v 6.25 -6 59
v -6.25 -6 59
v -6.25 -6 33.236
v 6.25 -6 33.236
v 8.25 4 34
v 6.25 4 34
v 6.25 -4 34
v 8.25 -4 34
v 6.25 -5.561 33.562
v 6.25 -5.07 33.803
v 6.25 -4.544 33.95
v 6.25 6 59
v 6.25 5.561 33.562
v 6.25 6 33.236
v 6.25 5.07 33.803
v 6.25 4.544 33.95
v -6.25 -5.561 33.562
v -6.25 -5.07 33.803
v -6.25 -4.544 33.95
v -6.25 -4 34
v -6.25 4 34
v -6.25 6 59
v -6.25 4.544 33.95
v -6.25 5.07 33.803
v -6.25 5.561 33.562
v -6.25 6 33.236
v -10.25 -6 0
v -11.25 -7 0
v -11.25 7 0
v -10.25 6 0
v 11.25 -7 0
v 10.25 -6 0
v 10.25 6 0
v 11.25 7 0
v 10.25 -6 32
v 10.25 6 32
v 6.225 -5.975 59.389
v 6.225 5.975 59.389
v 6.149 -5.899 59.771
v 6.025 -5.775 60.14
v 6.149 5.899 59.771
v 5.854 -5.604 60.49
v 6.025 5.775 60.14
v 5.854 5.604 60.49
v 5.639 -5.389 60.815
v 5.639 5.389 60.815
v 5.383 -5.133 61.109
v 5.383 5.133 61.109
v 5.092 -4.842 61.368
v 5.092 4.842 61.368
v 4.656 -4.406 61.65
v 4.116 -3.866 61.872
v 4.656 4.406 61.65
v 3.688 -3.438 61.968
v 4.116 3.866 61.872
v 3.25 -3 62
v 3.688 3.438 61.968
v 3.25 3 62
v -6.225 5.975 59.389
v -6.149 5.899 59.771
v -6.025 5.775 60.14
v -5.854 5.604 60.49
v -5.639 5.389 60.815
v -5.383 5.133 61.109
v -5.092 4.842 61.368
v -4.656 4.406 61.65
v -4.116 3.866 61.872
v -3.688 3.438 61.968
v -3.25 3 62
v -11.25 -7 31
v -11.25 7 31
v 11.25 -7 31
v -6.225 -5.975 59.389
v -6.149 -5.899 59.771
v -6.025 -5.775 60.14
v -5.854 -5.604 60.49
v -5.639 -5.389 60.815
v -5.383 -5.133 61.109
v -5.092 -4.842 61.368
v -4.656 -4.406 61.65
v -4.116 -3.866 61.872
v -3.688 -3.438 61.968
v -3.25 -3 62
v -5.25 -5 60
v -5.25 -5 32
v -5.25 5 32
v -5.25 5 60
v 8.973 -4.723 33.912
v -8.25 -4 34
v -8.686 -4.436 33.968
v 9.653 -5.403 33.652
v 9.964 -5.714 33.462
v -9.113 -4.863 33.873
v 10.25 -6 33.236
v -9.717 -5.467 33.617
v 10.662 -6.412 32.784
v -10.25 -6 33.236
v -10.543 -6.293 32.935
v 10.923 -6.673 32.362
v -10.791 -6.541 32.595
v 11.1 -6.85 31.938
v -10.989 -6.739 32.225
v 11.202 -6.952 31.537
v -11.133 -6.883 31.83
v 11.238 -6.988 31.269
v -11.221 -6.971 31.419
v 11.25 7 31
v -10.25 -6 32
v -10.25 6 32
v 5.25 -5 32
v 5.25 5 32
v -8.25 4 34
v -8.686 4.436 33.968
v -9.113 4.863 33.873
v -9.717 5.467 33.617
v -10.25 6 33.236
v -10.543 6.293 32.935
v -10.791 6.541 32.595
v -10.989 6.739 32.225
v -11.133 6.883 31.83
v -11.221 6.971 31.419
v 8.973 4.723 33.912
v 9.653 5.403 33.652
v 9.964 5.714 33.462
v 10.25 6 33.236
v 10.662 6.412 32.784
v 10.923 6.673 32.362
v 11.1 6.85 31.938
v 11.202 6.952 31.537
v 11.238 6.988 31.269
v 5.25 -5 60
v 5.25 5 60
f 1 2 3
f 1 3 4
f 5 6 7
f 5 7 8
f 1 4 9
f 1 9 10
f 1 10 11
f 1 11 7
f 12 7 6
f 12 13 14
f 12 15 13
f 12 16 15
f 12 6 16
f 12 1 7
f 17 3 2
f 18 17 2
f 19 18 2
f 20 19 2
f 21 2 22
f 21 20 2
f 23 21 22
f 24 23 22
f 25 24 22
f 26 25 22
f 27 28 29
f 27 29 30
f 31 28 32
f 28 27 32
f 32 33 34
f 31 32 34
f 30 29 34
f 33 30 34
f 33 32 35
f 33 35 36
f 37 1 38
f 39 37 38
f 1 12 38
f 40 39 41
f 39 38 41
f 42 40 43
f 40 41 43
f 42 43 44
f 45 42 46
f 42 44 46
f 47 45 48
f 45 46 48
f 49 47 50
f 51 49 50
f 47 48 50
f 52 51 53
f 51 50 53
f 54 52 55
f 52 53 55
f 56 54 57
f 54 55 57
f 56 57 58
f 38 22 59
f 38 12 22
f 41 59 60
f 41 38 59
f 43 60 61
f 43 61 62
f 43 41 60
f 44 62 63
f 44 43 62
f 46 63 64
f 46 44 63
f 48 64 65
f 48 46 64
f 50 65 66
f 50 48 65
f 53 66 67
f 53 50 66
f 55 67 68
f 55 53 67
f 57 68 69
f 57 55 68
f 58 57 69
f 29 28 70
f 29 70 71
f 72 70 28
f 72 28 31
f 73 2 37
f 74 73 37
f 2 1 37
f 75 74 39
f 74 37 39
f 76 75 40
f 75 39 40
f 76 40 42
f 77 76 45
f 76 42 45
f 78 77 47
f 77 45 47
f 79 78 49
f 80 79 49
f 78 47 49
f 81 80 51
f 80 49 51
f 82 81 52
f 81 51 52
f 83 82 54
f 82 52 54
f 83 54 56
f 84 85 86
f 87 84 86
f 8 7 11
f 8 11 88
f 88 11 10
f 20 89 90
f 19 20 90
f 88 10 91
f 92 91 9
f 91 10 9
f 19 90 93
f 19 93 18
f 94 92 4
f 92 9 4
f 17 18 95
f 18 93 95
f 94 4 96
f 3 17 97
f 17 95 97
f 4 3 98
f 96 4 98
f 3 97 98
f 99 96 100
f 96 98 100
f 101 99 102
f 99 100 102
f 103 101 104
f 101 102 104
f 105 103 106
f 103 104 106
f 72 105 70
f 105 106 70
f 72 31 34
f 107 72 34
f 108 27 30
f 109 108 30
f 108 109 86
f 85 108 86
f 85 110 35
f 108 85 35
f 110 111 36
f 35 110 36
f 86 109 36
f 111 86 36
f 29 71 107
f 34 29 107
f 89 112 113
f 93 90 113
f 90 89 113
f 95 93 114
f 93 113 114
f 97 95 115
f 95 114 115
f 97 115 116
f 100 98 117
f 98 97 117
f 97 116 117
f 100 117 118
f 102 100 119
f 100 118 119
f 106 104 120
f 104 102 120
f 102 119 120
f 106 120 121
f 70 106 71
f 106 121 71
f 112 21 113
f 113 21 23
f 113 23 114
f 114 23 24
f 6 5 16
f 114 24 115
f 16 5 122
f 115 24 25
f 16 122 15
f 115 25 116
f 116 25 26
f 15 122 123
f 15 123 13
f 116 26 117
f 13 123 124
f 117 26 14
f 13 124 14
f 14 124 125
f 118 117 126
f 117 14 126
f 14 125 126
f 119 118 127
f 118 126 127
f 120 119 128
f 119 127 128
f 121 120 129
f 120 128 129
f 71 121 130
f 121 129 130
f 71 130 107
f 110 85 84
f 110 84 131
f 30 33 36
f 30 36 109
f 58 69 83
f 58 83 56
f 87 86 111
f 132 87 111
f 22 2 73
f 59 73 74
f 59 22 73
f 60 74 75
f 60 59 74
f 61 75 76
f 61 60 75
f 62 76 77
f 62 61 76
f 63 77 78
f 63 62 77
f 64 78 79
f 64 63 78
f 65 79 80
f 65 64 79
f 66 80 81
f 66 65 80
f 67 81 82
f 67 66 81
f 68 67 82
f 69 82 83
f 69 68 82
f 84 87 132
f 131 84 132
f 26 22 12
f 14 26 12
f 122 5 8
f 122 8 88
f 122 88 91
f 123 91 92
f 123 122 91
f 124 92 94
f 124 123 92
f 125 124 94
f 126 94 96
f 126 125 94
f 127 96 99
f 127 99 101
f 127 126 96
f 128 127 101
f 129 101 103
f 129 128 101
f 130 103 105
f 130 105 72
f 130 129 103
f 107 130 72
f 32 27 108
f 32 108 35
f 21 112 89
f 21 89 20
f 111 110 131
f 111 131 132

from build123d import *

# Parameters (mm, degrees)
F0_W         = 12.5
F0_H         = 12
F0_W_2       = 10.5
F0_H_2       = 10
F1_DEPTH     = 62
F0_W_3       = 22.5
F0_H_3       = 14
F0_W_4       = 4
F2_DEPTH     = 34
F3_DEPTH     = 60
F4_DEPTH     = 32
F5_R         = 3
F6_T1_DEPTH  = 29
F6_T6_DEPTH  = 37.5
F6_T11_DEPTH = 37.5
F6_T16_DEPTH = 37.5
F6_T21_DEPTH = 37.5
F6_T26_DEPTH = 37.5
F6_T31_DEPTH = 37.5


# Not quite as in the source:
# - a fillet or chamfer that OpenCascade refuses, or shapes differently, is made with other operations: its cross-section is extruded or revolved along the edge and cut away or added


with BuildPart() as f1:
    # F0 (on Top) → F1 (new body)
    with BuildSketch(Plane.XY):
        Rectangle(F0_W, F0_H)
        Rectangle(F0_W_2, F0_H_2, mode=Mode.SUBTRACT)
        Rectangle(F0_W_2, F0_H_2)
    extrude(amount=F1_DEPTH)

    # F0 (on Top) → F2 (join)
    with BuildSketch(Plane.XY):
        Rectangle(F0_W_3, F0_H_3)
        Polygon((-10.25, -6), (-10.25, 6), (-6.25, 6), (6.25, 6), (10.25, 6), (10.25, -6), (6.25, -6), (-6.25, -6), align=None, mode=Mode.SUBTRACT)
        with Locations((-8.25, 0)):
            Rectangle(F0_W_4, F0_H)
        with Locations((8.25, 0)):
            Rectangle(F0_W_4, F0_H)
    extrude(amount=F2_DEPTH)

    # F0 (on Top) → F3 (cut)
    with BuildSketch(Plane.XY):
        Rectangle(F0_W_2, F0_H_2)
    extrude(amount=F3_DEPTH, mode=Mode.SUBTRACT)

    # F0 (on Top) → F4 (cut)
    with BuildSketch(Plane.XY):
        Rectangle(F0_W, F0_H)
        Rectangle(F0_W_2, F0_H_2, mode=Mode.SUBTRACT)
        with Locations((-8.25, 0)):
            Rectangle(F0_W_4, F0_H)
        with Locations((8.25, 0)):
            Rectangle(F0_W_4, F0_H)
    extrude(amount=F4_DEPTH, mode=Mode.SUBTRACT)

    # F5
    f5_edges = [f1.edges().sort_by_distance(p)[0] for p in [
        (0, 6, 62),
        (-6.25, 0, 62),
        (0, -6, 62),
        (6.25, 0, 62),
    ]]
    fillet(f5_edges, radius=F5_R)

    # F6: fillet of radius 3 on 4 edges, made by hand

    # F6_s2 → F6_t1 (cut)
    with BuildSketch(Plane.XZ.offset(-14.5)):
        with BuildLine():
            ThreePointArc((-8.25, 34), (-10.3713203436, 33.1213203436), (-11.25, 31))
            Line((-11.25, 31), (-11.25, 34))
            Line((-11.25, 34), (-8.25, 34))
        make_face()
        with BuildLine():
            ThreePointArc((8.25, 34), (10.3713203436, 33.1213203436), (11.25, 31))
            Line((11.25, 31), (11.25, 34))
            Line((11.25, 34), (8.25, 34))
        make_face()
    extrude(amount=F6_T1_DEPTH, mode=Mode.SUBTRACT)


with BuildPart() as f6_tool4:
    # F6_s5 → F6_t6 (new body)
    with BuildSketch(Plane.YZ.offset(-18.75)):
        with BuildLine():
            ThreePointArc((-4, 34), (-6.1213203436, 33.1213203436), (-7, 31))
            Line((-7, 31), (-7, 34))
            Line((-7, 34), (-4, 34))
        make_face()
    extrude(amount=F6_T6_DEPTH)

    split(bisect_by=Plane.YZ.offset(-6.25), keep=Keep.BOTTOM)


with BuildPart() as f1_1:
    add(f1.part)

    # F6_t3: cut F6_tool4
    add(f6_tool4.part, mode=Mode.SUBTRACT)


with BuildPart() as f6_tool9:
    # F6_s10 → F6_t11 (new body)
    with BuildSketch(Plane.YZ.offset(-18.75)):
        with BuildLine():
            ThreePointArc((-4, 34), (-6.1213203436, 33.1213203436), (-7, 31))
            Line((-7, 31), (-7, 34))
            Line((-7, 34), (-4, 34))
        make_face()
    extrude(amount=F6_T11_DEPTH)

    split(bisect_by=Plane.XZ.offset(6), keep=Keep.TOP)


with BuildPart() as f1_2:
    add(f1_1.part)

    # F6_t8: cut F6_tool9
    add(f6_tool9.part, mode=Mode.SUBTRACT)


with BuildPart() as f6_tool14:
    # F6_s15 → F6_t16 (new body)
    with BuildSketch(Plane.YZ.offset(-18.75)):
        with BuildLine():
            ThreePointArc((-4, 34), (-6.1213203436, 33.1213203436), (-7, 31))
            Line((-7, 31), (-7, 34))
            Line((-7, 34), (-4, 34))
        make_face()
    extrude(amount=F6_T16_DEPTH)

    split(bisect_by=Plane.YZ.offset(6.25), keep=Keep.TOP)


with BuildPart() as f1_3:
    add(f1_2.part)

    # F6_t13: cut F6_tool14
    add(f6_tool14.part, mode=Mode.SUBTRACT)


with BuildPart() as f6_tool19:
    # F6_s20 → F6_t21 (new body)
    with BuildSketch(Plane.YZ.offset(18.75)):
        with BuildLine():
            ThreePointArc((4, 34), (6.1213203436, 33.1213203436), (7, 31))
            Line((7, 31), (7, 34))
            Line((7, 34), (4, 34))
        make_face()
    extrude(amount=-F6_T21_DEPTH)

    split(bisect_by=Plane.YZ.offset(6.25), keep=Keep.TOP)


with BuildPart() as f1_4:
    add(f1_3.part)

    # F6_t18: cut F6_tool19
    add(f6_tool19.part, mode=Mode.SUBTRACT)


with BuildPart() as f6_tool24:
    # F6_s25 → F6_t26 (new body)
    with BuildSketch(Plane.YZ.offset(18.75)):
        with BuildLine():
            ThreePointArc((4, 34), (6.1213203436, 33.1213203436), (7, 31))
            Line((7, 31), (7, 34))
            Line((7, 34), (4, 34))
        make_face()
    extrude(amount=-F6_T26_DEPTH)

    split(bisect_by=Plane.XZ.offset(-6), keep=Keep.BOTTOM)


with BuildPart() as f1_5:
    add(f1_4.part)

    # F6_t23: cut F6_tool24
    add(f6_tool24.part, mode=Mode.SUBTRACT)


with BuildPart() as f6_tool29:
    # F6_s30 → F6_t31 (new body)
    with BuildSketch(Plane.YZ.offset(18.75)):
        with BuildLine():
            ThreePointArc((4, 34), (6.1213203436, 33.1213203436), (7, 31))
            Line((7, 31), (7, 34))
            Line((7, 34), (4, 34))
        make_face()
    extrude(amount=-F6_T31_DEPTH)

    split(bisect_by=Plane.YZ.offset(-6.25), keep=Keep.BOTTOM)


with BuildPart() as f1_6:
    add(f1_5.part)

    # F6_t28: cut F6_tool29
    add(f6_tool29.part, mode=Mode.SUBTRACT)


solid = f1_6.part
